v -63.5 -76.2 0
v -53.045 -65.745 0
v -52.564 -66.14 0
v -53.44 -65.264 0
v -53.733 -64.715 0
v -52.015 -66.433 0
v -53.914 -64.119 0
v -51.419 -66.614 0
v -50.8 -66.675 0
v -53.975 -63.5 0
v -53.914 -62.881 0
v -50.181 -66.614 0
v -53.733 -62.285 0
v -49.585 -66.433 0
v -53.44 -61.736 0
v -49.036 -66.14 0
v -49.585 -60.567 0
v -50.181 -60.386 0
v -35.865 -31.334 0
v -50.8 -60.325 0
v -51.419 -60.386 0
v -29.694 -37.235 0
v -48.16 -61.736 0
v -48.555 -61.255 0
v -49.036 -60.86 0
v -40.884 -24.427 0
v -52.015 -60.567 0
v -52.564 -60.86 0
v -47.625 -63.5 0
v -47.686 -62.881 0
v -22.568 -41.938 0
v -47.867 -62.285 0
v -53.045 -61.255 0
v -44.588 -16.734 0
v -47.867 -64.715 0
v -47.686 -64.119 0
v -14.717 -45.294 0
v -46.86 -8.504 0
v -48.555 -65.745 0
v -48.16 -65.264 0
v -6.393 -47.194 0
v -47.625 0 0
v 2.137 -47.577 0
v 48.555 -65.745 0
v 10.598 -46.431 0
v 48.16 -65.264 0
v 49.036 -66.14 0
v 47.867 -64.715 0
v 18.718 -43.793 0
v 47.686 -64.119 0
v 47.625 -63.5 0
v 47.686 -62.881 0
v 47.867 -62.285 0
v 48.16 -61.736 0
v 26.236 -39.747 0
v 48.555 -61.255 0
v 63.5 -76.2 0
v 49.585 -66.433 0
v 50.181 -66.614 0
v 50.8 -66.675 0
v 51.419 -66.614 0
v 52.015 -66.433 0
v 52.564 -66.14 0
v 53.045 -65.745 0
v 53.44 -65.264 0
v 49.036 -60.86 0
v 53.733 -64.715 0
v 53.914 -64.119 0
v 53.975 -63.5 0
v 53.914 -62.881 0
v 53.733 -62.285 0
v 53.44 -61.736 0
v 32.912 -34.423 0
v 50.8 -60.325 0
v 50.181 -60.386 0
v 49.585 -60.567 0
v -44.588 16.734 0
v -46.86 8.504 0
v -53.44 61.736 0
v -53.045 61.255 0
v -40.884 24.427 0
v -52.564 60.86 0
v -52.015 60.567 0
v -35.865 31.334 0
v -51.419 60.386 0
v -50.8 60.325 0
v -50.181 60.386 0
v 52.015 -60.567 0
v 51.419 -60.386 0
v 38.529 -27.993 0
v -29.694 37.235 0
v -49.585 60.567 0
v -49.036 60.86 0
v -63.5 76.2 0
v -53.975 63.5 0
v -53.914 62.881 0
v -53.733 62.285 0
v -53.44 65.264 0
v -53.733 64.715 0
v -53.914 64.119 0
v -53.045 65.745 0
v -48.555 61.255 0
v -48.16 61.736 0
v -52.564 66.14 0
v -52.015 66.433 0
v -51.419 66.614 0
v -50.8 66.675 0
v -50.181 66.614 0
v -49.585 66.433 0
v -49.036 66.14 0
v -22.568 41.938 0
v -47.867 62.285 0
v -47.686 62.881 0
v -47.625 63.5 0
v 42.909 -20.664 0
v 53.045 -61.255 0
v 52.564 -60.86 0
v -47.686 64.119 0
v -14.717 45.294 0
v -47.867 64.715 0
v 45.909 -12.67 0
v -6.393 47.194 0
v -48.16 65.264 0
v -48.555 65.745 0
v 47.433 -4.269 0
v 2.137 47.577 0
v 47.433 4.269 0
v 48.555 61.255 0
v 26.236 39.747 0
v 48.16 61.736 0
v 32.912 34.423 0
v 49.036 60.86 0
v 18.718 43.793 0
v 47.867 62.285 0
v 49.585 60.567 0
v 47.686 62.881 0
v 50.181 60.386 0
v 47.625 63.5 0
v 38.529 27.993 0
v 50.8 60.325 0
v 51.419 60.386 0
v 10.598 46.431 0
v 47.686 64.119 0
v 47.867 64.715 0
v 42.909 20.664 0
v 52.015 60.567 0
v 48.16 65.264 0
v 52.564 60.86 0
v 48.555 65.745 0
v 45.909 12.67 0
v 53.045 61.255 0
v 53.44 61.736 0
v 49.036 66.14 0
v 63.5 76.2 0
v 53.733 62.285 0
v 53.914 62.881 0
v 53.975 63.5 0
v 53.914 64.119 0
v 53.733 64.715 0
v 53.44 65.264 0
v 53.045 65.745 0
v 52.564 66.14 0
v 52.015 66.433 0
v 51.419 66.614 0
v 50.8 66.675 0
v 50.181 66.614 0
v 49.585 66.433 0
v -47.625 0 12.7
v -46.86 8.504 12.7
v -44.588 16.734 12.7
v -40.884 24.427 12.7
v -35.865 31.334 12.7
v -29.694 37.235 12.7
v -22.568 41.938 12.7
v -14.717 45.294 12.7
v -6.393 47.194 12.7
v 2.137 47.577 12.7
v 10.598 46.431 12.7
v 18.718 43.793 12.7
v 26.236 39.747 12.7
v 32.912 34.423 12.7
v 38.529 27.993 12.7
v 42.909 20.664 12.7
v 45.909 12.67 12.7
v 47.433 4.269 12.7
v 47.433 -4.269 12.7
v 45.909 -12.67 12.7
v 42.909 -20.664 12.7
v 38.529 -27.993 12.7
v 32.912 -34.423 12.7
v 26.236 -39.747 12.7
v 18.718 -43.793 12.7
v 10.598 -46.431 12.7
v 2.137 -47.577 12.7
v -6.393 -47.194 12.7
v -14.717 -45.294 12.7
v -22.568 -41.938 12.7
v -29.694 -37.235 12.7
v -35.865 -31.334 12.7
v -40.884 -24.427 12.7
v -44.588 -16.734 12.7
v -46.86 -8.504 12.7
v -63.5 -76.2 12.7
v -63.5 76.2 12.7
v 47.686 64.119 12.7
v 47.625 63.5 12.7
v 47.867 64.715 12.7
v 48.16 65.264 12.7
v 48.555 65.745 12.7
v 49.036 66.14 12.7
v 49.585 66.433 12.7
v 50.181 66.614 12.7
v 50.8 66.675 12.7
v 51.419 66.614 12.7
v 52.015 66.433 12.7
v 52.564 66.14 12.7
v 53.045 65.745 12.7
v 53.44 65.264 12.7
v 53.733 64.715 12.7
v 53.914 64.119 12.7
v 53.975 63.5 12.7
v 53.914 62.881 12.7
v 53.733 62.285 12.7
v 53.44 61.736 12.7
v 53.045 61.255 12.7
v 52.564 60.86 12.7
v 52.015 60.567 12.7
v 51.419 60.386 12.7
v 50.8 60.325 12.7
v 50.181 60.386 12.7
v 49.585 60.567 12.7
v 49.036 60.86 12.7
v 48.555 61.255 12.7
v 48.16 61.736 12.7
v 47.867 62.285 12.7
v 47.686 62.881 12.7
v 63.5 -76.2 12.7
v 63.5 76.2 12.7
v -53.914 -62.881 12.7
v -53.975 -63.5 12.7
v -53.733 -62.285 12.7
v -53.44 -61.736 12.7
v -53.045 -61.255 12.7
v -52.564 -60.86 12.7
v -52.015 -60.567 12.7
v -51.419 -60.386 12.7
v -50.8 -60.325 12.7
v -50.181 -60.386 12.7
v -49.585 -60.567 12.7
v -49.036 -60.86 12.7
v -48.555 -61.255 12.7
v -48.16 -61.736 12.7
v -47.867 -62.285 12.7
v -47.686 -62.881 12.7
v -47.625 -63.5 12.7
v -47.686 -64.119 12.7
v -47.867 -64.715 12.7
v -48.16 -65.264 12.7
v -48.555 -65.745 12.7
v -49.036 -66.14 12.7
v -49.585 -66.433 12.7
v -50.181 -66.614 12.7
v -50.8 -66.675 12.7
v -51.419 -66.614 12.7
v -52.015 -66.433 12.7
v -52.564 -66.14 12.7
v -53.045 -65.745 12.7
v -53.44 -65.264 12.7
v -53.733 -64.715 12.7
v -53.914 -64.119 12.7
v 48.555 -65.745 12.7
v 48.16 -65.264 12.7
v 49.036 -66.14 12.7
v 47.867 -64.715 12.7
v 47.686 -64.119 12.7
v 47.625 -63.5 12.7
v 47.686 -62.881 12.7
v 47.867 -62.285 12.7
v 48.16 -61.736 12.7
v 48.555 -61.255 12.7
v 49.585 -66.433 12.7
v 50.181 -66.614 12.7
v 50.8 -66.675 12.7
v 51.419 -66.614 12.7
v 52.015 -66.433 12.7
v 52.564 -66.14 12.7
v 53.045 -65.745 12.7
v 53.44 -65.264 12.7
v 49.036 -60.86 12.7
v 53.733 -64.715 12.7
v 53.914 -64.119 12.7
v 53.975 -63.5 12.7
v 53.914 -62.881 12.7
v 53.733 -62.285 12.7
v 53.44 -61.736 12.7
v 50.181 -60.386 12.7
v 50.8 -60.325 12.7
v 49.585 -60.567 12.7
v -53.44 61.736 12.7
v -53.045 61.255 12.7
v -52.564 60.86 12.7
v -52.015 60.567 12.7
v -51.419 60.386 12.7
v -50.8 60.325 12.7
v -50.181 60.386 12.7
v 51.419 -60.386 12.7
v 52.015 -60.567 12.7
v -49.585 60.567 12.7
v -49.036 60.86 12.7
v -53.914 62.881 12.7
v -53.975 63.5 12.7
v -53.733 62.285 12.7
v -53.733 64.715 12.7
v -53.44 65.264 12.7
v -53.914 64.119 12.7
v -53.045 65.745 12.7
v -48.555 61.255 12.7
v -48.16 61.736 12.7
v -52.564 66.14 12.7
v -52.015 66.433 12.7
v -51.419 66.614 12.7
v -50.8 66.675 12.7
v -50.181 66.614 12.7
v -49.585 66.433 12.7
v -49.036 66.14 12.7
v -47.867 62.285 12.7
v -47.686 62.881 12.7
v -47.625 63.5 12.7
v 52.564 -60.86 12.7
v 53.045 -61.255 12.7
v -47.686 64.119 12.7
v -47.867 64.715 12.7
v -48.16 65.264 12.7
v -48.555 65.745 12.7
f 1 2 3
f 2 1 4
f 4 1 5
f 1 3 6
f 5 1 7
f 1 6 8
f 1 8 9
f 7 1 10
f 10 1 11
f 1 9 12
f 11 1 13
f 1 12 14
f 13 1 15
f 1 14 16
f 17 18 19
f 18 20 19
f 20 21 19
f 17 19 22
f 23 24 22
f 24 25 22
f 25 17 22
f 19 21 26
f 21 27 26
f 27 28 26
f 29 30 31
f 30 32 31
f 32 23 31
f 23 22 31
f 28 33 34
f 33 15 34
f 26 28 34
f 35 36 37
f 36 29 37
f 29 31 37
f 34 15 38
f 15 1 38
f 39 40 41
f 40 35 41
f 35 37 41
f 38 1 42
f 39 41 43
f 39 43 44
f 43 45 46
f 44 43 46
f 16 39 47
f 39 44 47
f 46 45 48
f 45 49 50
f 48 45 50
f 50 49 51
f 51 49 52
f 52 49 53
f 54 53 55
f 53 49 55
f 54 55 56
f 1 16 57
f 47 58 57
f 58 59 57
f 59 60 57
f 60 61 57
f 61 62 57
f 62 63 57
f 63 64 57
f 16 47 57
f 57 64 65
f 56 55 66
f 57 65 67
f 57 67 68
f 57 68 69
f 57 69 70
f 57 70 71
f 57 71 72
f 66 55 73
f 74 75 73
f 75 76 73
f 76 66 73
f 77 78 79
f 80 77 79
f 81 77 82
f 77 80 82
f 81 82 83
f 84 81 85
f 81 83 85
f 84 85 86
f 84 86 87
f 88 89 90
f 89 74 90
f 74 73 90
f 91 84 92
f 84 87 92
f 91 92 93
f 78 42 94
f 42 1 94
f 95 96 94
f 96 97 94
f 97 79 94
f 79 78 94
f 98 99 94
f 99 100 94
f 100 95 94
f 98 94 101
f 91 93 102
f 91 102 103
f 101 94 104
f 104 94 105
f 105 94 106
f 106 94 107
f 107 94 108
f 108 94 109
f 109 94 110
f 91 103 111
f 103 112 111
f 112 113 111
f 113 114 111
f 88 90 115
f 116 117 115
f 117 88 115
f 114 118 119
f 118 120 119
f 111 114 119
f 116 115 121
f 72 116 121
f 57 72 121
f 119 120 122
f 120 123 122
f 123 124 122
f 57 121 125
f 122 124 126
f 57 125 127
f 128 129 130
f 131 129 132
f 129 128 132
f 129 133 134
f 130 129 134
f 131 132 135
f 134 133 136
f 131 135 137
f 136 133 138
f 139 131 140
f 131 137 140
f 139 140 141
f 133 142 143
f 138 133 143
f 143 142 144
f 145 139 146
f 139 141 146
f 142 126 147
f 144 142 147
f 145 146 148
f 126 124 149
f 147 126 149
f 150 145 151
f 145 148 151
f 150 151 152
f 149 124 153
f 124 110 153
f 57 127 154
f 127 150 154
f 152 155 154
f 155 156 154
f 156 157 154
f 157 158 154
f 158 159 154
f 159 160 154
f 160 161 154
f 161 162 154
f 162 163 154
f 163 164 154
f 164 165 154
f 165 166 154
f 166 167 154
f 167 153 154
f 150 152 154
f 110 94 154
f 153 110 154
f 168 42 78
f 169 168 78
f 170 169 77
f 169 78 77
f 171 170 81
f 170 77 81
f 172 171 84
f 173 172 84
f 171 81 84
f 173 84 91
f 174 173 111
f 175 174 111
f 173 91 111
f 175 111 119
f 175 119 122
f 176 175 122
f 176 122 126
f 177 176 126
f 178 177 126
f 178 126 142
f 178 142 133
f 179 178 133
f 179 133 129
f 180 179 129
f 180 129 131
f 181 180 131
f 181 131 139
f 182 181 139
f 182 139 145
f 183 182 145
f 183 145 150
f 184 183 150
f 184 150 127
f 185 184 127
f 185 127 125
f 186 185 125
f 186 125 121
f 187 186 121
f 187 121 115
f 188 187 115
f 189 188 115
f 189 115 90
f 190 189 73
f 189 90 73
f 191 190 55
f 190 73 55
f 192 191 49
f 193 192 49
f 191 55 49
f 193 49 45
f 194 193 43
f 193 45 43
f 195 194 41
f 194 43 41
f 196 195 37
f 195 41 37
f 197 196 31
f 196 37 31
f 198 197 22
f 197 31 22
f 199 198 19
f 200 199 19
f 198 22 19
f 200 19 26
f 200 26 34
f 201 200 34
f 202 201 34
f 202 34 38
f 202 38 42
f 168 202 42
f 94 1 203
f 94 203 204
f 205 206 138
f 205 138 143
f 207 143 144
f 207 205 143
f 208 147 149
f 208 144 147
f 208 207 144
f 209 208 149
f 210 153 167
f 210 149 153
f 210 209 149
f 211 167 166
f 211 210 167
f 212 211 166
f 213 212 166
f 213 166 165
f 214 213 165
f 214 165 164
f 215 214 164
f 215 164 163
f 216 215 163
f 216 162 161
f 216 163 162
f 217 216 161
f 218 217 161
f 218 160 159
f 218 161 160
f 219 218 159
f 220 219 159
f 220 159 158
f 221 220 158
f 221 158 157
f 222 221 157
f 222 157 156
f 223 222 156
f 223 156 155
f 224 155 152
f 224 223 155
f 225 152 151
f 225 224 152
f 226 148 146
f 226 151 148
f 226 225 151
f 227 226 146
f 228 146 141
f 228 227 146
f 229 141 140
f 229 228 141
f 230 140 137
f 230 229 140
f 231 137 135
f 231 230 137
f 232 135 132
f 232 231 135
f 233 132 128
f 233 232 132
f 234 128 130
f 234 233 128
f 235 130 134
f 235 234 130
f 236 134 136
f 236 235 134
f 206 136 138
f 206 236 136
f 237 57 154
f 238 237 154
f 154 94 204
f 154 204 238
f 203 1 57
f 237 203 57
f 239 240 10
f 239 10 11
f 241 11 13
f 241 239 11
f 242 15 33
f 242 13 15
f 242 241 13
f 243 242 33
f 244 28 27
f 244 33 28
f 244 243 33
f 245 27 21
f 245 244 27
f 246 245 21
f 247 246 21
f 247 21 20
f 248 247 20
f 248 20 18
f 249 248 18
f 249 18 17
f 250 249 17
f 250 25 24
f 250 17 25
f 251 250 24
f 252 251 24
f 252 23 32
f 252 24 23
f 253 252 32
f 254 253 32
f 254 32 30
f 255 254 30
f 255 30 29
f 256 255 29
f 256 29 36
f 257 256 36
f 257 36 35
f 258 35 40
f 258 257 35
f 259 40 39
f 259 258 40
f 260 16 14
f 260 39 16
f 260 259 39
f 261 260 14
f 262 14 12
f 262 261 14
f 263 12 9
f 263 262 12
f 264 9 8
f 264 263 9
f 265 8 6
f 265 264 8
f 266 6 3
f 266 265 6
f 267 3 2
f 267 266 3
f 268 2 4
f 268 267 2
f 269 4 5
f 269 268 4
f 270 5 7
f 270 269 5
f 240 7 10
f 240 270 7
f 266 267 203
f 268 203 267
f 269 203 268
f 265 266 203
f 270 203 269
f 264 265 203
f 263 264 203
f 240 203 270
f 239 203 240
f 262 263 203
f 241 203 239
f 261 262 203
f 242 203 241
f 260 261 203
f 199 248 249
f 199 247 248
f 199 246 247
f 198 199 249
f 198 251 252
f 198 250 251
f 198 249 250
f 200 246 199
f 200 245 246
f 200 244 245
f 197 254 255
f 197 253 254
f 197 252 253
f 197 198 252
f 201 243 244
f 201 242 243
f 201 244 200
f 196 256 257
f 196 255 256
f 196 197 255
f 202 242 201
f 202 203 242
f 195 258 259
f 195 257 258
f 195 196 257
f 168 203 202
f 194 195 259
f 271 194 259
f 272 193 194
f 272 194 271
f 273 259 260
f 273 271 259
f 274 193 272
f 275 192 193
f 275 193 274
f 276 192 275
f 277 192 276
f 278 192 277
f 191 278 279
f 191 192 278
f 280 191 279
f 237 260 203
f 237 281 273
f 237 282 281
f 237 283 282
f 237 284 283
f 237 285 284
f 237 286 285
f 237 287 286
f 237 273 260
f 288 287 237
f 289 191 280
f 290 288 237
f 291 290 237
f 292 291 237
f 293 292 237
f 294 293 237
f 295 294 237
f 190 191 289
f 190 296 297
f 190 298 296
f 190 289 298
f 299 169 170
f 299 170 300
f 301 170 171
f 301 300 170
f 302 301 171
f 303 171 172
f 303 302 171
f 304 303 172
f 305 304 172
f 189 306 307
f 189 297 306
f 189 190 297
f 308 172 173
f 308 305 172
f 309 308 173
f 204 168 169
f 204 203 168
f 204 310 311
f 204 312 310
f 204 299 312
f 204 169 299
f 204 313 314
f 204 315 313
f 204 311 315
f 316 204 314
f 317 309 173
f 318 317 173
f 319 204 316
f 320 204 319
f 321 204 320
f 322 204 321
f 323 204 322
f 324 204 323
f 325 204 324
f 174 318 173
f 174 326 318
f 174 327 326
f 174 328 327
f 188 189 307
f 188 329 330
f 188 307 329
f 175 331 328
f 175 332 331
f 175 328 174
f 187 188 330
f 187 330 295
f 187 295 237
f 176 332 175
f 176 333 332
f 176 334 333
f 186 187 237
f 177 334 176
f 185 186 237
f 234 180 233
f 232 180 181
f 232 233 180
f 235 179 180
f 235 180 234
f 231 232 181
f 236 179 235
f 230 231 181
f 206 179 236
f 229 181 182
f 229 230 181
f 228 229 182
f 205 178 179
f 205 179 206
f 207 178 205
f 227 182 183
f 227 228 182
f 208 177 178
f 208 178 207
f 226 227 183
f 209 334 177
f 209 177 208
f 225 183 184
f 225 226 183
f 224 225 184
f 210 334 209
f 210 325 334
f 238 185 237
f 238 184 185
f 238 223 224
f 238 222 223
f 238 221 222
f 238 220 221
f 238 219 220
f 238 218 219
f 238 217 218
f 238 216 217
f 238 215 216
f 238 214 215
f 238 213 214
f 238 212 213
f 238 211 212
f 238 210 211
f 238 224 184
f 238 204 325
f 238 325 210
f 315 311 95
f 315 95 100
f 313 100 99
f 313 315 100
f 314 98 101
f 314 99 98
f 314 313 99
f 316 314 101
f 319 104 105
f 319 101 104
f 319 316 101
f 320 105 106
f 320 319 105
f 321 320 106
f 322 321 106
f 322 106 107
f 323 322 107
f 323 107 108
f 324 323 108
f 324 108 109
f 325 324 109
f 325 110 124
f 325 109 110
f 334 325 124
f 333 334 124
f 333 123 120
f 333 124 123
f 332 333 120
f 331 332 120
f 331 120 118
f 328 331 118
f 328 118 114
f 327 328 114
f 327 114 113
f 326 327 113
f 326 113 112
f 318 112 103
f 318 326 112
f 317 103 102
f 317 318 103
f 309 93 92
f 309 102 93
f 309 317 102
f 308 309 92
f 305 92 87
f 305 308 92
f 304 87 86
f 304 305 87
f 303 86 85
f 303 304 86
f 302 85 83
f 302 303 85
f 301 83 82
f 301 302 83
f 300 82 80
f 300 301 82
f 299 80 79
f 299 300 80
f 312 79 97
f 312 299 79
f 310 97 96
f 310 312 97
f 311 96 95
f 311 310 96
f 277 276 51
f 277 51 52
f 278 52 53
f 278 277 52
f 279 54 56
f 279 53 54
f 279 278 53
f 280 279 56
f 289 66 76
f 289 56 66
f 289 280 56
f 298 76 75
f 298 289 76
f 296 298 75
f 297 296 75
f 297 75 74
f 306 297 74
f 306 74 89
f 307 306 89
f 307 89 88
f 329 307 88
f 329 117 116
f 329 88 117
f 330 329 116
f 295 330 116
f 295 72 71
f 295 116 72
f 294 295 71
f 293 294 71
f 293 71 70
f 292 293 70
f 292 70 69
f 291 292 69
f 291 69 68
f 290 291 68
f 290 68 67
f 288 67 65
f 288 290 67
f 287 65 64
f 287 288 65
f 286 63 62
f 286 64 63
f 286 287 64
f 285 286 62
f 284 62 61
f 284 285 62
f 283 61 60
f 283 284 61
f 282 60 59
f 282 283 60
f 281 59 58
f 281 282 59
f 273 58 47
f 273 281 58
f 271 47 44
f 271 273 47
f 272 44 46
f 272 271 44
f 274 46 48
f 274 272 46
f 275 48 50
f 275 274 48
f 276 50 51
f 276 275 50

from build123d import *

# Parameters (mm, degrees)
SKETCH1_W               = 127
SKETCH1_H               = 152.4
BOSS_EXTRUDE1_DEPTH     = 12.7
SKETCH2_R               = 47.625
CUT_EXTRUDE1_DEPTH      = 100.9999
CUT_EXTRUDE3_DEPTH      = 100.9999
CUT_EXTRUDE3_DEPTH_BACK = 100.9999
SKETCH3_R               = 3.175


with BuildPart() as part:
    # Sketch1 → Boss-Extrude1 (new body)
    with BuildSketch(Plane.XY):
        Rectangle(SKETCH1_W, SKETCH1_H)
    extrude(amount=BOSS_EXTRUDE1_DEPTH)

    # Sketch2 → Cut-Extrude1 (cut, through all)
    with BuildSketch(Plane(origin=(0, 0, 0), x_dir=(-1, 0, 0), z_dir=(0, 0, -1))):
        Circle(SKETCH2_R)
    extrude(amount=-CUT_EXTRUDE1_DEPTH, mode=Mode.SUBTRACT)

    # Sketch3 → Cut-Extrude3 (cut, two sides: drawn at the far end of the back side and taken through both)
    with BuildSketch(Plane(origin=(0, 0, 0), x_dir=(-1, 0, 0), z_dir=(0, 0, -1)).offset(-CUT_EXTRUDE3_DEPTH_BACK)):
        with Locations((-50.8, 63.5)):
            Circle(SKETCH3_R)
        with Locations((50.8, 63.5)):
            Circle(SKETCH3_R)
        with Locations((50.8, -63.5)):
            Circle(SKETCH3_R)
        with Locations((-50.8, -63.5)):
            Circle(SKETCH3_R)
    extrude(amount=CUT_EXTRUDE3_DEPTH + CUT_EXTRUDE3_DEPTH_BACK, mode=Mode.SUBTRACT)


solid = part.part
